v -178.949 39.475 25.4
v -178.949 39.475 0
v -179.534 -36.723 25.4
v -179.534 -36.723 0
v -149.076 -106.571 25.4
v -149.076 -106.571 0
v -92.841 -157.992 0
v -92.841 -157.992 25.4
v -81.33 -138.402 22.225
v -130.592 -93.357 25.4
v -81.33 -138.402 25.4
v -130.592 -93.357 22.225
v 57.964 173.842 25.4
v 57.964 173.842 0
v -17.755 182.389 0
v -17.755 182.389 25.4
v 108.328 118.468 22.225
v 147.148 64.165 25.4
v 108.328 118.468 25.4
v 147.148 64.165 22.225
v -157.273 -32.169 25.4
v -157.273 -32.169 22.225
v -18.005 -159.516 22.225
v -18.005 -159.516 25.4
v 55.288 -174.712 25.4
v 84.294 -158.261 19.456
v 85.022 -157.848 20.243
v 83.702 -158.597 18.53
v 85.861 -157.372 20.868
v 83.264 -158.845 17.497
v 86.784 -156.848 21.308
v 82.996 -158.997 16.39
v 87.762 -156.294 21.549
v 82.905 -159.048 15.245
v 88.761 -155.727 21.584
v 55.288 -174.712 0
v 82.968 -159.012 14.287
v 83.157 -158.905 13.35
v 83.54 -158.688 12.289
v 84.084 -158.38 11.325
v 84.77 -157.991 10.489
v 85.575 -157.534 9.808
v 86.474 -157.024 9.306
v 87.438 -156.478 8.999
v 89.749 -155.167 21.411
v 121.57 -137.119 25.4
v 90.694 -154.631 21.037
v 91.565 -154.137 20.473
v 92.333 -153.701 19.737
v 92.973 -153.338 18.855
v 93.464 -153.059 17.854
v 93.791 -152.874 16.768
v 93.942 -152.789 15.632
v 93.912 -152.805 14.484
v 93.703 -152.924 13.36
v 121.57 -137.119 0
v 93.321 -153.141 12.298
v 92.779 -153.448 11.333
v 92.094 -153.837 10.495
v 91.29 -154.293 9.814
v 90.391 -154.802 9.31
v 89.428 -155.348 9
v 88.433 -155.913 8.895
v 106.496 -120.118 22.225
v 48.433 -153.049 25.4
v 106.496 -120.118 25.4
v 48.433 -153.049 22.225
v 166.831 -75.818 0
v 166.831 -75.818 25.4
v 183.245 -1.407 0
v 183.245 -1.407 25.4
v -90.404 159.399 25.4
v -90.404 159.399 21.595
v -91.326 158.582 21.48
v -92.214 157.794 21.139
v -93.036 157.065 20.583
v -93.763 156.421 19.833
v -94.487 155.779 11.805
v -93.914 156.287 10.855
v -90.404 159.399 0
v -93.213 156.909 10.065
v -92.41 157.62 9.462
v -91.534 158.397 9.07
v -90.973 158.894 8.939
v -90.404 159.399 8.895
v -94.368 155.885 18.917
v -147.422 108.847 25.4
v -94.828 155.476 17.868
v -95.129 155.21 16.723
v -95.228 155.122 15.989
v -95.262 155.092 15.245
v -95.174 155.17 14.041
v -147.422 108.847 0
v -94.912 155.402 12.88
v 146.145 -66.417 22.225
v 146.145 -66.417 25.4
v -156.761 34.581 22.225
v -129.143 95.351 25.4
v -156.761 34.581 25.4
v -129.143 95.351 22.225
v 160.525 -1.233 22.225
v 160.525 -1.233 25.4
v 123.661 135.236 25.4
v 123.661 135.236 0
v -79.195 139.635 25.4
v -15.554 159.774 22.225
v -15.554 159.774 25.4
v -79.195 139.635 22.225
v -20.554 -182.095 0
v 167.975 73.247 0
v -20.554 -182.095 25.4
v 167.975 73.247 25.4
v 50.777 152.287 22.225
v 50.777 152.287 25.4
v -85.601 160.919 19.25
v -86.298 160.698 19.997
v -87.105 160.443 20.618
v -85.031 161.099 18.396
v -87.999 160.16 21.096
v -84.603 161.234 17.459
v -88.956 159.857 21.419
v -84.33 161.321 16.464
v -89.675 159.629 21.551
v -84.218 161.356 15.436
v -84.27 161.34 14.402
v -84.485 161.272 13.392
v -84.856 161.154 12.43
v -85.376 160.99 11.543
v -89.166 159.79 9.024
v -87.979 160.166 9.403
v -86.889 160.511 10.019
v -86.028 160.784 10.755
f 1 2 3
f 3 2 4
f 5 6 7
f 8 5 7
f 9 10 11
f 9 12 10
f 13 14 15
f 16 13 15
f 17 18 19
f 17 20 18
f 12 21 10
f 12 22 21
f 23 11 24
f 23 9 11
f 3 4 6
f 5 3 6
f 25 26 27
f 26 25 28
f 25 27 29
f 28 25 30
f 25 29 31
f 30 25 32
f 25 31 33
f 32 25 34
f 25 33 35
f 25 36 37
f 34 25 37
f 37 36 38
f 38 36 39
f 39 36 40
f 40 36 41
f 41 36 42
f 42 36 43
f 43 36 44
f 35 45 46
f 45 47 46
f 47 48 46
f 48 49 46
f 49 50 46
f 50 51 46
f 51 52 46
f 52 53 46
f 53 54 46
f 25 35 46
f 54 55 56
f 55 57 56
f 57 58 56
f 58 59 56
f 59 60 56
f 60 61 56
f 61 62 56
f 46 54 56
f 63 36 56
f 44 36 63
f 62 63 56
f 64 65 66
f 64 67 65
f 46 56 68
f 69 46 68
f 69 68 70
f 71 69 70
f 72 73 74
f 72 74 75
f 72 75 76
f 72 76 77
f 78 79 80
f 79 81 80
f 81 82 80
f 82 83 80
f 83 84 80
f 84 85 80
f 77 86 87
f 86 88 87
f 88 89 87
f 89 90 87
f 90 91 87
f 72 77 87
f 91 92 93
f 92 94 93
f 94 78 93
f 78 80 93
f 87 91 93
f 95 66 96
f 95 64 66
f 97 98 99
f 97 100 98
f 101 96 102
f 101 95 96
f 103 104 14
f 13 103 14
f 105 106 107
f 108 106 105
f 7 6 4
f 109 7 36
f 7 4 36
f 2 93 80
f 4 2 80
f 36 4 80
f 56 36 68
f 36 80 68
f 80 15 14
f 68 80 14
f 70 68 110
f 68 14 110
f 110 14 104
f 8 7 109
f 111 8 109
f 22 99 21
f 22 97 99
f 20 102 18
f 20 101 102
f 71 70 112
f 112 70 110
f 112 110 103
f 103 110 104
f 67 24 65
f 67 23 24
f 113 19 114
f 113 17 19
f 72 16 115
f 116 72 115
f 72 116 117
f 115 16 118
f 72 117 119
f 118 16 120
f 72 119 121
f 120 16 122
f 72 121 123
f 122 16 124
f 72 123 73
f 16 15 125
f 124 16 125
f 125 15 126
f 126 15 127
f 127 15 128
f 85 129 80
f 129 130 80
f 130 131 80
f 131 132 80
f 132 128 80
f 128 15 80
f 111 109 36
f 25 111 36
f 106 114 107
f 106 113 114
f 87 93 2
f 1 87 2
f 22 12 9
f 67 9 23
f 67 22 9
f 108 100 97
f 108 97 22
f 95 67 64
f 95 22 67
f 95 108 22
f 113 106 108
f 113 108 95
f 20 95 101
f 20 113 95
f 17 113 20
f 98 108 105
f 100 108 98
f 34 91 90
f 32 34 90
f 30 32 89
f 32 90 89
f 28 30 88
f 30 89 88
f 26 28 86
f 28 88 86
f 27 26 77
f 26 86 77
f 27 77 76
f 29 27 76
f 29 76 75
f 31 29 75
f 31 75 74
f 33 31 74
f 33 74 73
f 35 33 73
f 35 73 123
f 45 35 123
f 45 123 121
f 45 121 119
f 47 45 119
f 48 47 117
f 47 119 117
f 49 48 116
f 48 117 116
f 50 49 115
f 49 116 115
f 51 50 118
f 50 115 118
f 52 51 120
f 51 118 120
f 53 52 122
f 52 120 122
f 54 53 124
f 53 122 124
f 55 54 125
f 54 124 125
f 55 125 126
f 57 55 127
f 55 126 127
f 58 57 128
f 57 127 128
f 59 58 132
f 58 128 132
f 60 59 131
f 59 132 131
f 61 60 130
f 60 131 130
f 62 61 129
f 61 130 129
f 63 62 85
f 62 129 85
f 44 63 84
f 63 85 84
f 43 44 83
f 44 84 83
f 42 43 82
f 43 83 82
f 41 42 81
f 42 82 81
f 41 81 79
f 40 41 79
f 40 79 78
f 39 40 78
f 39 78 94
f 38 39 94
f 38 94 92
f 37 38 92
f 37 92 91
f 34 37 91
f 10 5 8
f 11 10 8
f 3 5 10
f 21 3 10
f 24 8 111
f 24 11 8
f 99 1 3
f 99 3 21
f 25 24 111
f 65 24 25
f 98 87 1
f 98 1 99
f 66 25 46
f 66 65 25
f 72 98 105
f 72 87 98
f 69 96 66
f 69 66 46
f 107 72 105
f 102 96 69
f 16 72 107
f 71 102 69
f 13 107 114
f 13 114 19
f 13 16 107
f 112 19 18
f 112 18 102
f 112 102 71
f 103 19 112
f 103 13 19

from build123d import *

# Parameters (mm, degrees)
F1_DEPTH = 25.4
F2_T     = -22.225
F4_D     = 12.7


with BuildPart() as f1:
    # F0 (on Top) → F1 (new body)
    with BuildSketch(Plane.XY):
        Polygon((-147.42167, 108.847304), (-178.948584, 39.475165), (-179.533662, -36.722589), (-149.075739, -106.570674), (-92.841266, -157.991721), (-20.553695, -182.094564), (55.287797, -174.711602), (121.569526, -137.119418), (166.83078, -75.81804), (183.245477, -1.407035), (167.975366, 73.24726), (123.660788, 135.236438), (57.964136, 173.842007), (-17.755041, 182.388714), (-90.40421, 159.398755), align=None)
    extrude(amount=F1_DEPTH)

    # F2
    f2_openings = [f1.faces().sort_by_distance(p)[0] for p in [
        (0, 0, 25.4),
    ]]
    offset(amount=F2_T, openings=f2_openings)

    # F4 (through all)
    with Locations(Plane(origin=(88.428662, -155.91551, 0), x_dir=(0.869839, 0.493336, 0), z_dir=(0.493336, -0.869839, 0))):
        with Locations((0, 15.245483)):
            Hole(F4_D / 2)


solid = f1.part
